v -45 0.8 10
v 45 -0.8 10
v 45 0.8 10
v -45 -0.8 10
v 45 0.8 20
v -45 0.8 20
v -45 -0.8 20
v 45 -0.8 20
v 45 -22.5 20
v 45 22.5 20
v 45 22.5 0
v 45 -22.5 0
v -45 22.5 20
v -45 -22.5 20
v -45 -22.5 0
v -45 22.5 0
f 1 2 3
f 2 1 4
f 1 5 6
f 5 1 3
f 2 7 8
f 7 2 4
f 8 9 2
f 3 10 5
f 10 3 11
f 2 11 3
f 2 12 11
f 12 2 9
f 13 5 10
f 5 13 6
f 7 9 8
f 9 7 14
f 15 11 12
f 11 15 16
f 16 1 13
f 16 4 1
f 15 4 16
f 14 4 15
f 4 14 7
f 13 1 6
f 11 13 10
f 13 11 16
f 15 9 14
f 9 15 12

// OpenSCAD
// Microscope slide drying rack
// Print orientation: base block on the bed (z = 0), slots open at the top

// ---------- Parameters ----------
block_len    = 90;    // base block length along X (mm)
block_wid    = 45;    // base block width along Y (mm)
block_h      = 20;    // base block height along Z (mm)

slot_count   = 10;    // number of slide slots
slot_len     = 77;    // slot length along X (mm)
slot_w       = 1.6;   // slot width along Y (mm)
slot_depth   = 10;    // slot depth into block from top face (mm)
slot_pitch   = 3.5;   // centre-to-centre slot spacing along Y (mm)

eps          = 0.5;   // overshoot of cutters past the top face (mm)

$fn = 64;

// ---------- Model ----------
difference() {
    // Base block, centred in X and Y, resting on z = 0
    translate([-block_len/2, -block_wid/2, 0])
        cube([block_len, block_wid, block_h]);

    // Parallel slots running along X, centred as a group in X and Y
    for (i = [0 : slot_count - 1]) {
        x = (i - (slot_count - 1)/2) * slot_pitch;
        translate([x - slot_len/2, -slot_w/2, block_h - slot_depth])
            cube([slot_len, slot_w, slot_depth + eps]);
    }
}
